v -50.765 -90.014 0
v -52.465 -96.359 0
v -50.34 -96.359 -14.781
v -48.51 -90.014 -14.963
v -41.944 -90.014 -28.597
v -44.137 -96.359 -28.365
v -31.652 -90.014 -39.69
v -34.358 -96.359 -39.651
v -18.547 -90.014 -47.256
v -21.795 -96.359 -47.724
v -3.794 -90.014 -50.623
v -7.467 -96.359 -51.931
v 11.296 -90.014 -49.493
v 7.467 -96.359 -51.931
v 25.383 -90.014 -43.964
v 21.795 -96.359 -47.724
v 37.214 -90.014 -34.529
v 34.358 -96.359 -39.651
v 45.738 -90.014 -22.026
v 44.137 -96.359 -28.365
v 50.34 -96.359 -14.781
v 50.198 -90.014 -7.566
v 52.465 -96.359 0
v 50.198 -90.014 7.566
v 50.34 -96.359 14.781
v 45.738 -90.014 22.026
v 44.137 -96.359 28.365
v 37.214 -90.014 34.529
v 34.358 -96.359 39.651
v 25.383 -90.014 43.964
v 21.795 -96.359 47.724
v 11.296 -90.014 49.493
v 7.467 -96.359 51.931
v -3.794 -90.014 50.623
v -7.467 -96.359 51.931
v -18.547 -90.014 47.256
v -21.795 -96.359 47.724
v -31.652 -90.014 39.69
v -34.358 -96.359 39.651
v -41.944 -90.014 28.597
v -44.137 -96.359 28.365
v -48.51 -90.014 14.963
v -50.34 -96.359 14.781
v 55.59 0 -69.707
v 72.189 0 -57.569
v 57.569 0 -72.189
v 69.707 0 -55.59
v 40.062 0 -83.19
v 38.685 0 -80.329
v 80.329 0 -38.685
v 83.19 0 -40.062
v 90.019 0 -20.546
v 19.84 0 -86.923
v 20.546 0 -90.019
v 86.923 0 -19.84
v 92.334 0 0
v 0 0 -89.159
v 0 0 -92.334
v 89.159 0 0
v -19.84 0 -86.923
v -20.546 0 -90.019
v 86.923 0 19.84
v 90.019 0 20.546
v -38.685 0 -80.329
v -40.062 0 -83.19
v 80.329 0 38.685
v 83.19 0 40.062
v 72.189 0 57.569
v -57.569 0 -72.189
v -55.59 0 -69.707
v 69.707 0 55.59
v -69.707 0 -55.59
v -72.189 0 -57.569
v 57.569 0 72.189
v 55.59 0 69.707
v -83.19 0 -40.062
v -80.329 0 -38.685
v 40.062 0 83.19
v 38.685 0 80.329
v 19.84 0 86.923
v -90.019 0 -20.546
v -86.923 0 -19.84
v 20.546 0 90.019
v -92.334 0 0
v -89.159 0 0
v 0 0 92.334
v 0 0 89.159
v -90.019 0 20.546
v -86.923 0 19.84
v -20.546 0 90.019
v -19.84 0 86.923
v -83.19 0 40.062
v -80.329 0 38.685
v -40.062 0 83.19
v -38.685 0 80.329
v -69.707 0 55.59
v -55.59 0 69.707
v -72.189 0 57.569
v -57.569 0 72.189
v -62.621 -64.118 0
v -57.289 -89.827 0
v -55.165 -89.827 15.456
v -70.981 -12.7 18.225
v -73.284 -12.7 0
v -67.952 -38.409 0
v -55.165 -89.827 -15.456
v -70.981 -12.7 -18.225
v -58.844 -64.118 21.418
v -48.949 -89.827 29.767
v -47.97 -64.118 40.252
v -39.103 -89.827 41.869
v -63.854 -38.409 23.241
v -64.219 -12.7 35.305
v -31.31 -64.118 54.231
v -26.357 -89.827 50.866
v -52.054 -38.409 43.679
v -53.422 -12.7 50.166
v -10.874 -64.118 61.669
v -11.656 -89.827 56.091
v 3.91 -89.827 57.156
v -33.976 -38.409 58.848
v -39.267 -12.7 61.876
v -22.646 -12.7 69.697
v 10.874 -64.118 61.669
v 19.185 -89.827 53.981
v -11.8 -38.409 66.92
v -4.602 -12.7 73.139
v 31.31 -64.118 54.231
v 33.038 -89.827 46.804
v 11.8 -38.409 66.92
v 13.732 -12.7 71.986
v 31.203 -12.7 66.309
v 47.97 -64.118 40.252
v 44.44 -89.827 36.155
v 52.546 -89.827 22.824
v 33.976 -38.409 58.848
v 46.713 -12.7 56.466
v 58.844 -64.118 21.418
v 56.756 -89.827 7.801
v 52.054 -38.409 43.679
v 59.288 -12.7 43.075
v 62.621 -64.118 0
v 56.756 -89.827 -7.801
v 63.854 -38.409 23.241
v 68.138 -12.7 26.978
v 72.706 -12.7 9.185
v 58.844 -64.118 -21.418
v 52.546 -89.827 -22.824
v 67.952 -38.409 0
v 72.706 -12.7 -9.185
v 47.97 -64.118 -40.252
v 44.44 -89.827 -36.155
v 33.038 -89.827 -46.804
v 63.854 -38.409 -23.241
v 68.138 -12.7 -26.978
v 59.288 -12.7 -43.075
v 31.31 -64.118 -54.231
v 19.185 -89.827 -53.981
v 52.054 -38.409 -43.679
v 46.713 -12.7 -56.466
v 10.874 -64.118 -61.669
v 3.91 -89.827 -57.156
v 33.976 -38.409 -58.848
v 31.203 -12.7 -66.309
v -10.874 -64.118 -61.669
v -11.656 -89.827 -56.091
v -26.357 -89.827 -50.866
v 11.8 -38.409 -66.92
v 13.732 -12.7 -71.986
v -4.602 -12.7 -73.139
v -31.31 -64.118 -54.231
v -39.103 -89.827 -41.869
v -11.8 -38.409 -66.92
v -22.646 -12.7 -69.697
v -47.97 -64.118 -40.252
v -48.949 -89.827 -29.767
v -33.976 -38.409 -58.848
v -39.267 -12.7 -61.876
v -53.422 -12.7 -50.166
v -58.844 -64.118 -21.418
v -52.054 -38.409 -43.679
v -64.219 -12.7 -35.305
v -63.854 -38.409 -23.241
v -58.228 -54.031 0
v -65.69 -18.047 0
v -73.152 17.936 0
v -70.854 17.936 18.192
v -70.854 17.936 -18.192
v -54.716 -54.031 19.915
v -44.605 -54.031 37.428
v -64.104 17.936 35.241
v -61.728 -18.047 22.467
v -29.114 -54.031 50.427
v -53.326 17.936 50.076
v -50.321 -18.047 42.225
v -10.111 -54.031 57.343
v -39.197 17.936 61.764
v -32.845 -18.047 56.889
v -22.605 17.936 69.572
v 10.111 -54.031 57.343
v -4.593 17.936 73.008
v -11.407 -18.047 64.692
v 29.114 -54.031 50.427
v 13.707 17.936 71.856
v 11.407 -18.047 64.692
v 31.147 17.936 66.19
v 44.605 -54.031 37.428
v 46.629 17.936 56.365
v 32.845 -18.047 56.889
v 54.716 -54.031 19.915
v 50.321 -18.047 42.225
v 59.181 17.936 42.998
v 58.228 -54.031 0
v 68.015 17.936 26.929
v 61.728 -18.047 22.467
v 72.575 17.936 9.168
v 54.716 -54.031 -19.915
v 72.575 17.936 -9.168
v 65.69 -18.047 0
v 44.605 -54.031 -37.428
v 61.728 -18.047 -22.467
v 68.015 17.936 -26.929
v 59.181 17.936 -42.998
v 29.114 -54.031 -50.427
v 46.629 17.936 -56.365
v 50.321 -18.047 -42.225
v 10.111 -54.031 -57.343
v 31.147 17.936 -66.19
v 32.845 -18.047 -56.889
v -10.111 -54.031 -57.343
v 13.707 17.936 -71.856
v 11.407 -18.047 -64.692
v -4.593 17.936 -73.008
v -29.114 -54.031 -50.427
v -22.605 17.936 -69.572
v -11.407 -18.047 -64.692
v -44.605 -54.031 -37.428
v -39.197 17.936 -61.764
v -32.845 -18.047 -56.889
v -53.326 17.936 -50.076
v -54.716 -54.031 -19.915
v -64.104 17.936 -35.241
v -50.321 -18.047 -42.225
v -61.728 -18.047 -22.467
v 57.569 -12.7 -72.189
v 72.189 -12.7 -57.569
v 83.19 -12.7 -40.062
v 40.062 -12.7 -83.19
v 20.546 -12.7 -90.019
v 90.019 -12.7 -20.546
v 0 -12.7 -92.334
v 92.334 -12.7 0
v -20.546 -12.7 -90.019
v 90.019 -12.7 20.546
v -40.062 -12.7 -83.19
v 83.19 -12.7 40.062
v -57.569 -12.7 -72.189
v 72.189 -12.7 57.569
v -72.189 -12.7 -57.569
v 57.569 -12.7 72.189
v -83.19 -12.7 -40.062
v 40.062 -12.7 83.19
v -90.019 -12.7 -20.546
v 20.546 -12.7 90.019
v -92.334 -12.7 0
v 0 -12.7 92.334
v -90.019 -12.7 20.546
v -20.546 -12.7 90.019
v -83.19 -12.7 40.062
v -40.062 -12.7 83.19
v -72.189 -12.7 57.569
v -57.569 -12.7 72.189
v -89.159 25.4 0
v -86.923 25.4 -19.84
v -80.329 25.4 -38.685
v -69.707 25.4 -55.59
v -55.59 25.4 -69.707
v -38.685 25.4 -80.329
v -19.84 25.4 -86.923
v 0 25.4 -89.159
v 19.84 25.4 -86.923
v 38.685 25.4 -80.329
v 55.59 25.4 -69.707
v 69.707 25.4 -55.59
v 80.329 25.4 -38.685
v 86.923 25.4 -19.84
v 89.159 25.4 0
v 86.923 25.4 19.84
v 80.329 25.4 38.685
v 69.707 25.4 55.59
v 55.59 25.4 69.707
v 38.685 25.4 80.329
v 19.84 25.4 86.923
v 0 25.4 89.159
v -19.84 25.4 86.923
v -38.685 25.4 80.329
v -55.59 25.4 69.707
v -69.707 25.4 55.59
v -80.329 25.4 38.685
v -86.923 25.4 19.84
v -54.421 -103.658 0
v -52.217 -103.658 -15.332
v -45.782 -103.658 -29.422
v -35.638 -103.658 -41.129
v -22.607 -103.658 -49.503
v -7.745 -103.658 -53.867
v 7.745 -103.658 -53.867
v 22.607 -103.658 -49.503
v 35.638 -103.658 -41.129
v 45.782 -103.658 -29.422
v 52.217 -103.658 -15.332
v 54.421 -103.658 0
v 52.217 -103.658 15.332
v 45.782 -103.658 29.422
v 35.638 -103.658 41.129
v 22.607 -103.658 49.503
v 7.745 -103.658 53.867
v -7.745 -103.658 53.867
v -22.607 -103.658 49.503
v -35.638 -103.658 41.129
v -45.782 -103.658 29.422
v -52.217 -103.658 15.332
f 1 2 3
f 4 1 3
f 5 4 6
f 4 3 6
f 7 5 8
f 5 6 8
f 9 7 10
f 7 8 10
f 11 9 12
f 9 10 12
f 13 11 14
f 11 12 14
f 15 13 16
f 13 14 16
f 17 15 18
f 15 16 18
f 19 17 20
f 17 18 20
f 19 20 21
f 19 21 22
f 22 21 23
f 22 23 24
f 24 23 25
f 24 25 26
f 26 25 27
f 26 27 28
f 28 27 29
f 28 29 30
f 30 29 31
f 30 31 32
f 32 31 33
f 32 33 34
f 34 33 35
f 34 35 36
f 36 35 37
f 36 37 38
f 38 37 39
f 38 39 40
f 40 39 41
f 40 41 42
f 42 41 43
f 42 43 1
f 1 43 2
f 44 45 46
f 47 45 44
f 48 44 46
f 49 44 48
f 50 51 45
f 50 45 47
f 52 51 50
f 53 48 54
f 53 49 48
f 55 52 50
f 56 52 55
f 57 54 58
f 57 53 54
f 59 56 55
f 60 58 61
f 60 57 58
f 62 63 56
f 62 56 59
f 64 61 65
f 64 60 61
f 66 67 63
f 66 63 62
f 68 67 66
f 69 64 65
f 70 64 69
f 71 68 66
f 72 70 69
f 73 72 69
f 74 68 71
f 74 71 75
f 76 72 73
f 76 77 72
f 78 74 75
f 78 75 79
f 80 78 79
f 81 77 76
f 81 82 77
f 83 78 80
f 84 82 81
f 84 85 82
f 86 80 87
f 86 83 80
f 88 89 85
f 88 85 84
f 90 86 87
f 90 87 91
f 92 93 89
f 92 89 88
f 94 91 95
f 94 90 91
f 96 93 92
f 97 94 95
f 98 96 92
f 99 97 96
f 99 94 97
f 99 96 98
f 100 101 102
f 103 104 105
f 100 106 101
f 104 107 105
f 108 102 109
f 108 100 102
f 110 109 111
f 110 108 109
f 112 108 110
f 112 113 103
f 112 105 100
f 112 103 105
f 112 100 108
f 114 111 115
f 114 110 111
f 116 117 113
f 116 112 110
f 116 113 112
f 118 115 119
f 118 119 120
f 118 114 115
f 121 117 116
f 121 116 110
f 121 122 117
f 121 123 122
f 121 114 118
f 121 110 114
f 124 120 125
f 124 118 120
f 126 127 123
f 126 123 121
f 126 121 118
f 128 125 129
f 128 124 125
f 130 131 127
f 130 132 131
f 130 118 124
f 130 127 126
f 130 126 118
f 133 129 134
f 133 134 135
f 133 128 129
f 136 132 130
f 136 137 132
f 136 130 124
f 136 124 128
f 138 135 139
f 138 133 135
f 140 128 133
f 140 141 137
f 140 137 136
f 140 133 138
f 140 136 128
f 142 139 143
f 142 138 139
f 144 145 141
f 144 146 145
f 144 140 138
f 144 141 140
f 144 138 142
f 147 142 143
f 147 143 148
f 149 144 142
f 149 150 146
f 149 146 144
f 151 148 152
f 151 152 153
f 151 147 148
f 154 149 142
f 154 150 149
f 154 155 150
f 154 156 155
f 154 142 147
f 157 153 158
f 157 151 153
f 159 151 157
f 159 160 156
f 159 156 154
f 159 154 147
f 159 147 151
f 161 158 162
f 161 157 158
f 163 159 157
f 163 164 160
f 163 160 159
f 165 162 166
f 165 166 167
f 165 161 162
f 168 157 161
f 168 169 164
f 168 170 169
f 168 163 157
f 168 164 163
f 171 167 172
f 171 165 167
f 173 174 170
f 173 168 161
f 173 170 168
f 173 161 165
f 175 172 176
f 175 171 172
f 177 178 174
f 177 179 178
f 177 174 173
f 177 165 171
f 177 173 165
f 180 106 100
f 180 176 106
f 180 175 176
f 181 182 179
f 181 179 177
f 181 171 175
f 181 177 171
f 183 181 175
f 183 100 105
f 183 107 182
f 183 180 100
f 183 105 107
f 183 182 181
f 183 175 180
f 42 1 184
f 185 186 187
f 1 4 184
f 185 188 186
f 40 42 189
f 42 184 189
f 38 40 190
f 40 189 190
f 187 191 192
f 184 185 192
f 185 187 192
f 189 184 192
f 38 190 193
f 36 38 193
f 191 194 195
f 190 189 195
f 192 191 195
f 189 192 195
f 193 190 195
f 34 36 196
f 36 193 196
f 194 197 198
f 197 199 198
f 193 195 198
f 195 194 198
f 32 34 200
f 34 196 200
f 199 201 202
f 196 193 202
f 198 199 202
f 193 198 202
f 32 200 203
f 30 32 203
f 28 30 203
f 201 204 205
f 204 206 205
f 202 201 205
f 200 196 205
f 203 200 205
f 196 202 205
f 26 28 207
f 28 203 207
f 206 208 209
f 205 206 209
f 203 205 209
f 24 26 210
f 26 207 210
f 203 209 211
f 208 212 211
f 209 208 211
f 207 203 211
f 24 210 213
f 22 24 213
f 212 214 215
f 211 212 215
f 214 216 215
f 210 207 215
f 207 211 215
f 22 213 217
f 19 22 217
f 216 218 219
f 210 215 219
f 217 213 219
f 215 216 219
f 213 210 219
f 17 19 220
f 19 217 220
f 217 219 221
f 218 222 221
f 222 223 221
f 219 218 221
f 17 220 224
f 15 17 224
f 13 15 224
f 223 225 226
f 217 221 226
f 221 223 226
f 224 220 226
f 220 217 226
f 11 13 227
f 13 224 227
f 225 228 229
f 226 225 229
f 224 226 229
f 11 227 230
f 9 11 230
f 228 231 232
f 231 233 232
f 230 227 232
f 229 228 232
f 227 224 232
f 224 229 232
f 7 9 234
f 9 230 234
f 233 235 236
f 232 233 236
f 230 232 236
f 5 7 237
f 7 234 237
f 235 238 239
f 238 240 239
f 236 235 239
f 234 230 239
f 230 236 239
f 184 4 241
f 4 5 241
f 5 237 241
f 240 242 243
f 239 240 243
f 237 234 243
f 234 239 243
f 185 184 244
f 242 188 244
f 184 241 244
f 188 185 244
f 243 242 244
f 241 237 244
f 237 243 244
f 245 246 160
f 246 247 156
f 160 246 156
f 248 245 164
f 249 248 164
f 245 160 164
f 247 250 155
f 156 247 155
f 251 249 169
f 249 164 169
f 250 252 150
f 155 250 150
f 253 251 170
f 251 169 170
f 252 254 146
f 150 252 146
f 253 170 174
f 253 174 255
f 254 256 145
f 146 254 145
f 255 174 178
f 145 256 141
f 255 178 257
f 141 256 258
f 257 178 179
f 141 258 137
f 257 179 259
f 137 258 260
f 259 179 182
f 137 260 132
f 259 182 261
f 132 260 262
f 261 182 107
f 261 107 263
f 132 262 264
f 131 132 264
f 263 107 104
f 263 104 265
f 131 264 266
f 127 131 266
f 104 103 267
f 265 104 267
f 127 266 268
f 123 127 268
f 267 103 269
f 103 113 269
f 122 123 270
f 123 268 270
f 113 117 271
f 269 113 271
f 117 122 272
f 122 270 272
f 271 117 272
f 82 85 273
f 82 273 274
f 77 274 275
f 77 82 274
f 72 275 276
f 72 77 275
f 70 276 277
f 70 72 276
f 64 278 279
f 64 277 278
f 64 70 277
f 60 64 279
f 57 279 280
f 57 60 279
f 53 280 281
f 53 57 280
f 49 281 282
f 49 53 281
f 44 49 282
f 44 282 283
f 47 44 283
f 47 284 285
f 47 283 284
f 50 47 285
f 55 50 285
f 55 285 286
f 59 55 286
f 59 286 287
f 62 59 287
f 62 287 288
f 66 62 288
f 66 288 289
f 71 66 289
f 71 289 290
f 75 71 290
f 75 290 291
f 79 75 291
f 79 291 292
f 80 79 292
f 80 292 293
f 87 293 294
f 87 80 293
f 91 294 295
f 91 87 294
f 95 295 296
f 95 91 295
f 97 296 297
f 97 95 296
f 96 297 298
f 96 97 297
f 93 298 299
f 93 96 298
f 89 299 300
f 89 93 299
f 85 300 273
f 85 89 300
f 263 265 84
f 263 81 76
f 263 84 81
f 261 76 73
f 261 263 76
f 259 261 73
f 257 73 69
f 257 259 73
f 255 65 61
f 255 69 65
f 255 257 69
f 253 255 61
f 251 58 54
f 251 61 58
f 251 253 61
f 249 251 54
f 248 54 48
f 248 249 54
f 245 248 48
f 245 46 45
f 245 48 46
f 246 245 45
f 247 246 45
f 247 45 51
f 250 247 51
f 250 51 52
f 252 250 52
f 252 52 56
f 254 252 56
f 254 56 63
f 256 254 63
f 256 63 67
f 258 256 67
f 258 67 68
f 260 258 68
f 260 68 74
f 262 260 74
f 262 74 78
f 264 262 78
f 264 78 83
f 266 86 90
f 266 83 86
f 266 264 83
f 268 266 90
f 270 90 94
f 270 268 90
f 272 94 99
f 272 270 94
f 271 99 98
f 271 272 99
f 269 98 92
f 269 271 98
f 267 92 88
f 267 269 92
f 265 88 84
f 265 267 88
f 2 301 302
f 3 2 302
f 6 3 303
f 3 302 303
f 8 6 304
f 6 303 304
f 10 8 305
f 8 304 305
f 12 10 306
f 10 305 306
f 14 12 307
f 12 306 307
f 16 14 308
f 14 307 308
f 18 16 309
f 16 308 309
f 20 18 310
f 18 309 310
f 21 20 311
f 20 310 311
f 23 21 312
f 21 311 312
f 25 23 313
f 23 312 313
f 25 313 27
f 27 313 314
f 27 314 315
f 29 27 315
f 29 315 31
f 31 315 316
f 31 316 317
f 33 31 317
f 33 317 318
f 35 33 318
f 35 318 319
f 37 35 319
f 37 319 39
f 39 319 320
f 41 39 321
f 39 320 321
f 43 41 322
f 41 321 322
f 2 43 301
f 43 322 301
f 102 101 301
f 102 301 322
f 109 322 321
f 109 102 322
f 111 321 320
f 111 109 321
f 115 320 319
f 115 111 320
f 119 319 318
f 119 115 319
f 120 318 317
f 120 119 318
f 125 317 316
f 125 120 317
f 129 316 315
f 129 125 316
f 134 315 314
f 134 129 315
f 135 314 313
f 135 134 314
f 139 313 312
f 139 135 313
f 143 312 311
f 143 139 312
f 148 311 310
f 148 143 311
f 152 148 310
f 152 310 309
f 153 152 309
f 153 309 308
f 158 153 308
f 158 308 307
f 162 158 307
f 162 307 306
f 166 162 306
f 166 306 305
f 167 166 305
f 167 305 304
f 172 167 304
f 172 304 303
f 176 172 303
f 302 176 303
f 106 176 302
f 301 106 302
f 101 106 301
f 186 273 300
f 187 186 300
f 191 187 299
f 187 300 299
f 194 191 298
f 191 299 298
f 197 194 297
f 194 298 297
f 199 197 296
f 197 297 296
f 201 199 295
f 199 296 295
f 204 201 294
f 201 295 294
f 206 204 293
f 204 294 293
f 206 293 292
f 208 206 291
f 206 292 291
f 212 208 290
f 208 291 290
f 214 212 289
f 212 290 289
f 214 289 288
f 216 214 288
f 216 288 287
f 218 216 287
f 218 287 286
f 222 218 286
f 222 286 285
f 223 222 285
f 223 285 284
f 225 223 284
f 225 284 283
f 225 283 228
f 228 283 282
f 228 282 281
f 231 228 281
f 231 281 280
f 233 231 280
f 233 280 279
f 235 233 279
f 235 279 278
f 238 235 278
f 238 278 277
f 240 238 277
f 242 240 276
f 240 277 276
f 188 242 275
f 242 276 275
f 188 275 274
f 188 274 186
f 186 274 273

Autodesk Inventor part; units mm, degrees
ref_plane "YZ Plane" through (0, 0, 0) normal (1, 0, 0) x (0, 1, 0)
ref_plane "XZ Plane" through (0, 0, 0) normal (0, 1, 0) x (-1, 0, 0)
ref_plane "XY Plane" through (0, 0, 0) normal (0, 0, 1) x (1, 0, 0)
sketch "Sketch1" plane through (0, 0, 0) normal (0, 0, 1) x (1, 0, 0)
  line L0 (0, 25.4) -> (-28.702, 25.4) construction
  line L1 (0, 25.4) -> (-95.25, 25.4) construction
  line L2 (-95.25, 25.4) -> (-89.1588, 25.4) construction
  line L3 (-89.1588, 25.4) -> (-85.693, 23.7839) construction
  line L4 (-89.1588, 25.4) -> (-89.1588, 21.1626) construction
  line L5 (-89.1588, 0) -> (-92.3338, 0)
  line L6 (-28.702, 59.6457) -> (-28.702, -91.9304) construction
  arc A0 (-28.9184, -8.4804) -> (-32.3684, -1.0818) centre (-35.052, -6.8369) ccw
  line L7 (-89.1588, 25.4) -> (-89.1588, 0)
  line L8 (-89.1588, 25.4) -> (-32.3684, -1.0818)
  line L9 (-28.9184, -8.4804) -> (-28.9392, -8.5583)
  line L10 (0, -319.0244) -> (0, 122.7573) projected
  line L11 (-73.152, 17.9359) -> (-28.702, 17.9359) construction
  line L12 (-89.1588, 0) -> (-92.3338, 0)
  line L13 (11.4547, -6.8369) -> (-136.2084, -6.8369) construction
  line L14 (-57.2892, -89.8271) -> (-74.8171, -155.2422)
  line L15 (-92.3338, -12.7) -> (-73.2838, -12.7)
  line L16 (-73.2838, -12.7) -> (-54.421, -103.6575)
  line L17 (-74.8171, -155.2422) -> (-68.2431, -155.2422)
  line L18 (-92.3338, -25.4) -> (-79.6338, -25.4)
  line L19 (-79.6338, -25.4) -> (-79.6338, -57.15)
  line L20 (-79.6338, -57.15) -> (-72.991, -88.4936)
  line L21 (-92.3338, 0) -> (-92.3338, -25.4)
  line L22 (-86.3902, -25.4) -> (-86.3902, -31.3436)
  line L23 (-86.3902, -31.3436) -> (-92.3338, -31.3436)
  line L24 (-92.3338, -31.3436) -> (-92.3338, -56.7436)
  line L25 (-92.3338, -56.7436) -> (-79.6338, -56.7436)
  line L26 (-73.152, 17.9359) -> (-32.3684, -1.0818)
  line L27 (-73.152, 17.9359) -> (-50.7653, -90.0141)
  line L28 (-50.7653, -90.0141) -> (-28.9184, -8.4804)
  line L29 (-52.4654, -96.3589) -> (-28.9184, -8.4804)
  line L30 (-86.36, -222.8555) -> (-28.9184, -8.4804)
  line L31 (-72.991, -88.4936) -> (-89.535, -222.8555)
  line L32 (-89.535, -222.8555) -> (-86.36, -222.8555)
  line L33 (-54.421, -103.6575) -> (-50.7653, -90.0141)
  line L34 (-73.152, 17.9359) -> (-89.1588, 25.4)
  line L35 (-89.1588, 0) -> (-89.1588, 25.4)
  line L36 (-89.1588, 0) -> (-92.3338, 0)
  line L37 (-92.3338, -12.7) -> (-73.2838, -12.7)
  line L38 (-73.2838, -12.7) -> (-54.421, -103.6575)
  line L39 (-92.3338, -12.7) -> (-92.3338, 0)
  point P0 (0, 0)
  point P1 (-95.25, -255.9127)
  point P2 (-88.7095, 22.4389)
  dimension "d0" = 28.702
  dimension "d3" = 25
  dimension "d5" = 25.4
  dimension "d6" = 25.4
  dimension "d8" = 12.7
  dimension "d34" = 15
  dimension "d37" = 44.45
  dimension "d46" = 19.05
  dimension "d47" = 12.7
  dimension "d55" = 12.7
  dimension "d56" = 31.75
  dimension "d58" = 0.25
  dimension "d60" = 12.7
  dimension "d61" = 25.4
  dimension "d62" = 5.9436
  dimension "d63" = 5.9436
  dimension "d64" = 3.175
  dimension "d68" = 107.95
  dimension "d69" = 6.35
  dimension "d70" = 6.35
  dimension "d71" = 3.175
  dimension "d73" = 86.36
  dimension "d74" = 31.75
  dimension "d75" = 6.3448
revolve "Revolution3" add sketch "Sketch1" angle 360 about axis through (0, -10, 0) along (0, 1, 0) contours L7 L8 L27 L29 L30 L16 L15 L21 L5
properties part number "phenolic_top" material "Phenolic Resin"
